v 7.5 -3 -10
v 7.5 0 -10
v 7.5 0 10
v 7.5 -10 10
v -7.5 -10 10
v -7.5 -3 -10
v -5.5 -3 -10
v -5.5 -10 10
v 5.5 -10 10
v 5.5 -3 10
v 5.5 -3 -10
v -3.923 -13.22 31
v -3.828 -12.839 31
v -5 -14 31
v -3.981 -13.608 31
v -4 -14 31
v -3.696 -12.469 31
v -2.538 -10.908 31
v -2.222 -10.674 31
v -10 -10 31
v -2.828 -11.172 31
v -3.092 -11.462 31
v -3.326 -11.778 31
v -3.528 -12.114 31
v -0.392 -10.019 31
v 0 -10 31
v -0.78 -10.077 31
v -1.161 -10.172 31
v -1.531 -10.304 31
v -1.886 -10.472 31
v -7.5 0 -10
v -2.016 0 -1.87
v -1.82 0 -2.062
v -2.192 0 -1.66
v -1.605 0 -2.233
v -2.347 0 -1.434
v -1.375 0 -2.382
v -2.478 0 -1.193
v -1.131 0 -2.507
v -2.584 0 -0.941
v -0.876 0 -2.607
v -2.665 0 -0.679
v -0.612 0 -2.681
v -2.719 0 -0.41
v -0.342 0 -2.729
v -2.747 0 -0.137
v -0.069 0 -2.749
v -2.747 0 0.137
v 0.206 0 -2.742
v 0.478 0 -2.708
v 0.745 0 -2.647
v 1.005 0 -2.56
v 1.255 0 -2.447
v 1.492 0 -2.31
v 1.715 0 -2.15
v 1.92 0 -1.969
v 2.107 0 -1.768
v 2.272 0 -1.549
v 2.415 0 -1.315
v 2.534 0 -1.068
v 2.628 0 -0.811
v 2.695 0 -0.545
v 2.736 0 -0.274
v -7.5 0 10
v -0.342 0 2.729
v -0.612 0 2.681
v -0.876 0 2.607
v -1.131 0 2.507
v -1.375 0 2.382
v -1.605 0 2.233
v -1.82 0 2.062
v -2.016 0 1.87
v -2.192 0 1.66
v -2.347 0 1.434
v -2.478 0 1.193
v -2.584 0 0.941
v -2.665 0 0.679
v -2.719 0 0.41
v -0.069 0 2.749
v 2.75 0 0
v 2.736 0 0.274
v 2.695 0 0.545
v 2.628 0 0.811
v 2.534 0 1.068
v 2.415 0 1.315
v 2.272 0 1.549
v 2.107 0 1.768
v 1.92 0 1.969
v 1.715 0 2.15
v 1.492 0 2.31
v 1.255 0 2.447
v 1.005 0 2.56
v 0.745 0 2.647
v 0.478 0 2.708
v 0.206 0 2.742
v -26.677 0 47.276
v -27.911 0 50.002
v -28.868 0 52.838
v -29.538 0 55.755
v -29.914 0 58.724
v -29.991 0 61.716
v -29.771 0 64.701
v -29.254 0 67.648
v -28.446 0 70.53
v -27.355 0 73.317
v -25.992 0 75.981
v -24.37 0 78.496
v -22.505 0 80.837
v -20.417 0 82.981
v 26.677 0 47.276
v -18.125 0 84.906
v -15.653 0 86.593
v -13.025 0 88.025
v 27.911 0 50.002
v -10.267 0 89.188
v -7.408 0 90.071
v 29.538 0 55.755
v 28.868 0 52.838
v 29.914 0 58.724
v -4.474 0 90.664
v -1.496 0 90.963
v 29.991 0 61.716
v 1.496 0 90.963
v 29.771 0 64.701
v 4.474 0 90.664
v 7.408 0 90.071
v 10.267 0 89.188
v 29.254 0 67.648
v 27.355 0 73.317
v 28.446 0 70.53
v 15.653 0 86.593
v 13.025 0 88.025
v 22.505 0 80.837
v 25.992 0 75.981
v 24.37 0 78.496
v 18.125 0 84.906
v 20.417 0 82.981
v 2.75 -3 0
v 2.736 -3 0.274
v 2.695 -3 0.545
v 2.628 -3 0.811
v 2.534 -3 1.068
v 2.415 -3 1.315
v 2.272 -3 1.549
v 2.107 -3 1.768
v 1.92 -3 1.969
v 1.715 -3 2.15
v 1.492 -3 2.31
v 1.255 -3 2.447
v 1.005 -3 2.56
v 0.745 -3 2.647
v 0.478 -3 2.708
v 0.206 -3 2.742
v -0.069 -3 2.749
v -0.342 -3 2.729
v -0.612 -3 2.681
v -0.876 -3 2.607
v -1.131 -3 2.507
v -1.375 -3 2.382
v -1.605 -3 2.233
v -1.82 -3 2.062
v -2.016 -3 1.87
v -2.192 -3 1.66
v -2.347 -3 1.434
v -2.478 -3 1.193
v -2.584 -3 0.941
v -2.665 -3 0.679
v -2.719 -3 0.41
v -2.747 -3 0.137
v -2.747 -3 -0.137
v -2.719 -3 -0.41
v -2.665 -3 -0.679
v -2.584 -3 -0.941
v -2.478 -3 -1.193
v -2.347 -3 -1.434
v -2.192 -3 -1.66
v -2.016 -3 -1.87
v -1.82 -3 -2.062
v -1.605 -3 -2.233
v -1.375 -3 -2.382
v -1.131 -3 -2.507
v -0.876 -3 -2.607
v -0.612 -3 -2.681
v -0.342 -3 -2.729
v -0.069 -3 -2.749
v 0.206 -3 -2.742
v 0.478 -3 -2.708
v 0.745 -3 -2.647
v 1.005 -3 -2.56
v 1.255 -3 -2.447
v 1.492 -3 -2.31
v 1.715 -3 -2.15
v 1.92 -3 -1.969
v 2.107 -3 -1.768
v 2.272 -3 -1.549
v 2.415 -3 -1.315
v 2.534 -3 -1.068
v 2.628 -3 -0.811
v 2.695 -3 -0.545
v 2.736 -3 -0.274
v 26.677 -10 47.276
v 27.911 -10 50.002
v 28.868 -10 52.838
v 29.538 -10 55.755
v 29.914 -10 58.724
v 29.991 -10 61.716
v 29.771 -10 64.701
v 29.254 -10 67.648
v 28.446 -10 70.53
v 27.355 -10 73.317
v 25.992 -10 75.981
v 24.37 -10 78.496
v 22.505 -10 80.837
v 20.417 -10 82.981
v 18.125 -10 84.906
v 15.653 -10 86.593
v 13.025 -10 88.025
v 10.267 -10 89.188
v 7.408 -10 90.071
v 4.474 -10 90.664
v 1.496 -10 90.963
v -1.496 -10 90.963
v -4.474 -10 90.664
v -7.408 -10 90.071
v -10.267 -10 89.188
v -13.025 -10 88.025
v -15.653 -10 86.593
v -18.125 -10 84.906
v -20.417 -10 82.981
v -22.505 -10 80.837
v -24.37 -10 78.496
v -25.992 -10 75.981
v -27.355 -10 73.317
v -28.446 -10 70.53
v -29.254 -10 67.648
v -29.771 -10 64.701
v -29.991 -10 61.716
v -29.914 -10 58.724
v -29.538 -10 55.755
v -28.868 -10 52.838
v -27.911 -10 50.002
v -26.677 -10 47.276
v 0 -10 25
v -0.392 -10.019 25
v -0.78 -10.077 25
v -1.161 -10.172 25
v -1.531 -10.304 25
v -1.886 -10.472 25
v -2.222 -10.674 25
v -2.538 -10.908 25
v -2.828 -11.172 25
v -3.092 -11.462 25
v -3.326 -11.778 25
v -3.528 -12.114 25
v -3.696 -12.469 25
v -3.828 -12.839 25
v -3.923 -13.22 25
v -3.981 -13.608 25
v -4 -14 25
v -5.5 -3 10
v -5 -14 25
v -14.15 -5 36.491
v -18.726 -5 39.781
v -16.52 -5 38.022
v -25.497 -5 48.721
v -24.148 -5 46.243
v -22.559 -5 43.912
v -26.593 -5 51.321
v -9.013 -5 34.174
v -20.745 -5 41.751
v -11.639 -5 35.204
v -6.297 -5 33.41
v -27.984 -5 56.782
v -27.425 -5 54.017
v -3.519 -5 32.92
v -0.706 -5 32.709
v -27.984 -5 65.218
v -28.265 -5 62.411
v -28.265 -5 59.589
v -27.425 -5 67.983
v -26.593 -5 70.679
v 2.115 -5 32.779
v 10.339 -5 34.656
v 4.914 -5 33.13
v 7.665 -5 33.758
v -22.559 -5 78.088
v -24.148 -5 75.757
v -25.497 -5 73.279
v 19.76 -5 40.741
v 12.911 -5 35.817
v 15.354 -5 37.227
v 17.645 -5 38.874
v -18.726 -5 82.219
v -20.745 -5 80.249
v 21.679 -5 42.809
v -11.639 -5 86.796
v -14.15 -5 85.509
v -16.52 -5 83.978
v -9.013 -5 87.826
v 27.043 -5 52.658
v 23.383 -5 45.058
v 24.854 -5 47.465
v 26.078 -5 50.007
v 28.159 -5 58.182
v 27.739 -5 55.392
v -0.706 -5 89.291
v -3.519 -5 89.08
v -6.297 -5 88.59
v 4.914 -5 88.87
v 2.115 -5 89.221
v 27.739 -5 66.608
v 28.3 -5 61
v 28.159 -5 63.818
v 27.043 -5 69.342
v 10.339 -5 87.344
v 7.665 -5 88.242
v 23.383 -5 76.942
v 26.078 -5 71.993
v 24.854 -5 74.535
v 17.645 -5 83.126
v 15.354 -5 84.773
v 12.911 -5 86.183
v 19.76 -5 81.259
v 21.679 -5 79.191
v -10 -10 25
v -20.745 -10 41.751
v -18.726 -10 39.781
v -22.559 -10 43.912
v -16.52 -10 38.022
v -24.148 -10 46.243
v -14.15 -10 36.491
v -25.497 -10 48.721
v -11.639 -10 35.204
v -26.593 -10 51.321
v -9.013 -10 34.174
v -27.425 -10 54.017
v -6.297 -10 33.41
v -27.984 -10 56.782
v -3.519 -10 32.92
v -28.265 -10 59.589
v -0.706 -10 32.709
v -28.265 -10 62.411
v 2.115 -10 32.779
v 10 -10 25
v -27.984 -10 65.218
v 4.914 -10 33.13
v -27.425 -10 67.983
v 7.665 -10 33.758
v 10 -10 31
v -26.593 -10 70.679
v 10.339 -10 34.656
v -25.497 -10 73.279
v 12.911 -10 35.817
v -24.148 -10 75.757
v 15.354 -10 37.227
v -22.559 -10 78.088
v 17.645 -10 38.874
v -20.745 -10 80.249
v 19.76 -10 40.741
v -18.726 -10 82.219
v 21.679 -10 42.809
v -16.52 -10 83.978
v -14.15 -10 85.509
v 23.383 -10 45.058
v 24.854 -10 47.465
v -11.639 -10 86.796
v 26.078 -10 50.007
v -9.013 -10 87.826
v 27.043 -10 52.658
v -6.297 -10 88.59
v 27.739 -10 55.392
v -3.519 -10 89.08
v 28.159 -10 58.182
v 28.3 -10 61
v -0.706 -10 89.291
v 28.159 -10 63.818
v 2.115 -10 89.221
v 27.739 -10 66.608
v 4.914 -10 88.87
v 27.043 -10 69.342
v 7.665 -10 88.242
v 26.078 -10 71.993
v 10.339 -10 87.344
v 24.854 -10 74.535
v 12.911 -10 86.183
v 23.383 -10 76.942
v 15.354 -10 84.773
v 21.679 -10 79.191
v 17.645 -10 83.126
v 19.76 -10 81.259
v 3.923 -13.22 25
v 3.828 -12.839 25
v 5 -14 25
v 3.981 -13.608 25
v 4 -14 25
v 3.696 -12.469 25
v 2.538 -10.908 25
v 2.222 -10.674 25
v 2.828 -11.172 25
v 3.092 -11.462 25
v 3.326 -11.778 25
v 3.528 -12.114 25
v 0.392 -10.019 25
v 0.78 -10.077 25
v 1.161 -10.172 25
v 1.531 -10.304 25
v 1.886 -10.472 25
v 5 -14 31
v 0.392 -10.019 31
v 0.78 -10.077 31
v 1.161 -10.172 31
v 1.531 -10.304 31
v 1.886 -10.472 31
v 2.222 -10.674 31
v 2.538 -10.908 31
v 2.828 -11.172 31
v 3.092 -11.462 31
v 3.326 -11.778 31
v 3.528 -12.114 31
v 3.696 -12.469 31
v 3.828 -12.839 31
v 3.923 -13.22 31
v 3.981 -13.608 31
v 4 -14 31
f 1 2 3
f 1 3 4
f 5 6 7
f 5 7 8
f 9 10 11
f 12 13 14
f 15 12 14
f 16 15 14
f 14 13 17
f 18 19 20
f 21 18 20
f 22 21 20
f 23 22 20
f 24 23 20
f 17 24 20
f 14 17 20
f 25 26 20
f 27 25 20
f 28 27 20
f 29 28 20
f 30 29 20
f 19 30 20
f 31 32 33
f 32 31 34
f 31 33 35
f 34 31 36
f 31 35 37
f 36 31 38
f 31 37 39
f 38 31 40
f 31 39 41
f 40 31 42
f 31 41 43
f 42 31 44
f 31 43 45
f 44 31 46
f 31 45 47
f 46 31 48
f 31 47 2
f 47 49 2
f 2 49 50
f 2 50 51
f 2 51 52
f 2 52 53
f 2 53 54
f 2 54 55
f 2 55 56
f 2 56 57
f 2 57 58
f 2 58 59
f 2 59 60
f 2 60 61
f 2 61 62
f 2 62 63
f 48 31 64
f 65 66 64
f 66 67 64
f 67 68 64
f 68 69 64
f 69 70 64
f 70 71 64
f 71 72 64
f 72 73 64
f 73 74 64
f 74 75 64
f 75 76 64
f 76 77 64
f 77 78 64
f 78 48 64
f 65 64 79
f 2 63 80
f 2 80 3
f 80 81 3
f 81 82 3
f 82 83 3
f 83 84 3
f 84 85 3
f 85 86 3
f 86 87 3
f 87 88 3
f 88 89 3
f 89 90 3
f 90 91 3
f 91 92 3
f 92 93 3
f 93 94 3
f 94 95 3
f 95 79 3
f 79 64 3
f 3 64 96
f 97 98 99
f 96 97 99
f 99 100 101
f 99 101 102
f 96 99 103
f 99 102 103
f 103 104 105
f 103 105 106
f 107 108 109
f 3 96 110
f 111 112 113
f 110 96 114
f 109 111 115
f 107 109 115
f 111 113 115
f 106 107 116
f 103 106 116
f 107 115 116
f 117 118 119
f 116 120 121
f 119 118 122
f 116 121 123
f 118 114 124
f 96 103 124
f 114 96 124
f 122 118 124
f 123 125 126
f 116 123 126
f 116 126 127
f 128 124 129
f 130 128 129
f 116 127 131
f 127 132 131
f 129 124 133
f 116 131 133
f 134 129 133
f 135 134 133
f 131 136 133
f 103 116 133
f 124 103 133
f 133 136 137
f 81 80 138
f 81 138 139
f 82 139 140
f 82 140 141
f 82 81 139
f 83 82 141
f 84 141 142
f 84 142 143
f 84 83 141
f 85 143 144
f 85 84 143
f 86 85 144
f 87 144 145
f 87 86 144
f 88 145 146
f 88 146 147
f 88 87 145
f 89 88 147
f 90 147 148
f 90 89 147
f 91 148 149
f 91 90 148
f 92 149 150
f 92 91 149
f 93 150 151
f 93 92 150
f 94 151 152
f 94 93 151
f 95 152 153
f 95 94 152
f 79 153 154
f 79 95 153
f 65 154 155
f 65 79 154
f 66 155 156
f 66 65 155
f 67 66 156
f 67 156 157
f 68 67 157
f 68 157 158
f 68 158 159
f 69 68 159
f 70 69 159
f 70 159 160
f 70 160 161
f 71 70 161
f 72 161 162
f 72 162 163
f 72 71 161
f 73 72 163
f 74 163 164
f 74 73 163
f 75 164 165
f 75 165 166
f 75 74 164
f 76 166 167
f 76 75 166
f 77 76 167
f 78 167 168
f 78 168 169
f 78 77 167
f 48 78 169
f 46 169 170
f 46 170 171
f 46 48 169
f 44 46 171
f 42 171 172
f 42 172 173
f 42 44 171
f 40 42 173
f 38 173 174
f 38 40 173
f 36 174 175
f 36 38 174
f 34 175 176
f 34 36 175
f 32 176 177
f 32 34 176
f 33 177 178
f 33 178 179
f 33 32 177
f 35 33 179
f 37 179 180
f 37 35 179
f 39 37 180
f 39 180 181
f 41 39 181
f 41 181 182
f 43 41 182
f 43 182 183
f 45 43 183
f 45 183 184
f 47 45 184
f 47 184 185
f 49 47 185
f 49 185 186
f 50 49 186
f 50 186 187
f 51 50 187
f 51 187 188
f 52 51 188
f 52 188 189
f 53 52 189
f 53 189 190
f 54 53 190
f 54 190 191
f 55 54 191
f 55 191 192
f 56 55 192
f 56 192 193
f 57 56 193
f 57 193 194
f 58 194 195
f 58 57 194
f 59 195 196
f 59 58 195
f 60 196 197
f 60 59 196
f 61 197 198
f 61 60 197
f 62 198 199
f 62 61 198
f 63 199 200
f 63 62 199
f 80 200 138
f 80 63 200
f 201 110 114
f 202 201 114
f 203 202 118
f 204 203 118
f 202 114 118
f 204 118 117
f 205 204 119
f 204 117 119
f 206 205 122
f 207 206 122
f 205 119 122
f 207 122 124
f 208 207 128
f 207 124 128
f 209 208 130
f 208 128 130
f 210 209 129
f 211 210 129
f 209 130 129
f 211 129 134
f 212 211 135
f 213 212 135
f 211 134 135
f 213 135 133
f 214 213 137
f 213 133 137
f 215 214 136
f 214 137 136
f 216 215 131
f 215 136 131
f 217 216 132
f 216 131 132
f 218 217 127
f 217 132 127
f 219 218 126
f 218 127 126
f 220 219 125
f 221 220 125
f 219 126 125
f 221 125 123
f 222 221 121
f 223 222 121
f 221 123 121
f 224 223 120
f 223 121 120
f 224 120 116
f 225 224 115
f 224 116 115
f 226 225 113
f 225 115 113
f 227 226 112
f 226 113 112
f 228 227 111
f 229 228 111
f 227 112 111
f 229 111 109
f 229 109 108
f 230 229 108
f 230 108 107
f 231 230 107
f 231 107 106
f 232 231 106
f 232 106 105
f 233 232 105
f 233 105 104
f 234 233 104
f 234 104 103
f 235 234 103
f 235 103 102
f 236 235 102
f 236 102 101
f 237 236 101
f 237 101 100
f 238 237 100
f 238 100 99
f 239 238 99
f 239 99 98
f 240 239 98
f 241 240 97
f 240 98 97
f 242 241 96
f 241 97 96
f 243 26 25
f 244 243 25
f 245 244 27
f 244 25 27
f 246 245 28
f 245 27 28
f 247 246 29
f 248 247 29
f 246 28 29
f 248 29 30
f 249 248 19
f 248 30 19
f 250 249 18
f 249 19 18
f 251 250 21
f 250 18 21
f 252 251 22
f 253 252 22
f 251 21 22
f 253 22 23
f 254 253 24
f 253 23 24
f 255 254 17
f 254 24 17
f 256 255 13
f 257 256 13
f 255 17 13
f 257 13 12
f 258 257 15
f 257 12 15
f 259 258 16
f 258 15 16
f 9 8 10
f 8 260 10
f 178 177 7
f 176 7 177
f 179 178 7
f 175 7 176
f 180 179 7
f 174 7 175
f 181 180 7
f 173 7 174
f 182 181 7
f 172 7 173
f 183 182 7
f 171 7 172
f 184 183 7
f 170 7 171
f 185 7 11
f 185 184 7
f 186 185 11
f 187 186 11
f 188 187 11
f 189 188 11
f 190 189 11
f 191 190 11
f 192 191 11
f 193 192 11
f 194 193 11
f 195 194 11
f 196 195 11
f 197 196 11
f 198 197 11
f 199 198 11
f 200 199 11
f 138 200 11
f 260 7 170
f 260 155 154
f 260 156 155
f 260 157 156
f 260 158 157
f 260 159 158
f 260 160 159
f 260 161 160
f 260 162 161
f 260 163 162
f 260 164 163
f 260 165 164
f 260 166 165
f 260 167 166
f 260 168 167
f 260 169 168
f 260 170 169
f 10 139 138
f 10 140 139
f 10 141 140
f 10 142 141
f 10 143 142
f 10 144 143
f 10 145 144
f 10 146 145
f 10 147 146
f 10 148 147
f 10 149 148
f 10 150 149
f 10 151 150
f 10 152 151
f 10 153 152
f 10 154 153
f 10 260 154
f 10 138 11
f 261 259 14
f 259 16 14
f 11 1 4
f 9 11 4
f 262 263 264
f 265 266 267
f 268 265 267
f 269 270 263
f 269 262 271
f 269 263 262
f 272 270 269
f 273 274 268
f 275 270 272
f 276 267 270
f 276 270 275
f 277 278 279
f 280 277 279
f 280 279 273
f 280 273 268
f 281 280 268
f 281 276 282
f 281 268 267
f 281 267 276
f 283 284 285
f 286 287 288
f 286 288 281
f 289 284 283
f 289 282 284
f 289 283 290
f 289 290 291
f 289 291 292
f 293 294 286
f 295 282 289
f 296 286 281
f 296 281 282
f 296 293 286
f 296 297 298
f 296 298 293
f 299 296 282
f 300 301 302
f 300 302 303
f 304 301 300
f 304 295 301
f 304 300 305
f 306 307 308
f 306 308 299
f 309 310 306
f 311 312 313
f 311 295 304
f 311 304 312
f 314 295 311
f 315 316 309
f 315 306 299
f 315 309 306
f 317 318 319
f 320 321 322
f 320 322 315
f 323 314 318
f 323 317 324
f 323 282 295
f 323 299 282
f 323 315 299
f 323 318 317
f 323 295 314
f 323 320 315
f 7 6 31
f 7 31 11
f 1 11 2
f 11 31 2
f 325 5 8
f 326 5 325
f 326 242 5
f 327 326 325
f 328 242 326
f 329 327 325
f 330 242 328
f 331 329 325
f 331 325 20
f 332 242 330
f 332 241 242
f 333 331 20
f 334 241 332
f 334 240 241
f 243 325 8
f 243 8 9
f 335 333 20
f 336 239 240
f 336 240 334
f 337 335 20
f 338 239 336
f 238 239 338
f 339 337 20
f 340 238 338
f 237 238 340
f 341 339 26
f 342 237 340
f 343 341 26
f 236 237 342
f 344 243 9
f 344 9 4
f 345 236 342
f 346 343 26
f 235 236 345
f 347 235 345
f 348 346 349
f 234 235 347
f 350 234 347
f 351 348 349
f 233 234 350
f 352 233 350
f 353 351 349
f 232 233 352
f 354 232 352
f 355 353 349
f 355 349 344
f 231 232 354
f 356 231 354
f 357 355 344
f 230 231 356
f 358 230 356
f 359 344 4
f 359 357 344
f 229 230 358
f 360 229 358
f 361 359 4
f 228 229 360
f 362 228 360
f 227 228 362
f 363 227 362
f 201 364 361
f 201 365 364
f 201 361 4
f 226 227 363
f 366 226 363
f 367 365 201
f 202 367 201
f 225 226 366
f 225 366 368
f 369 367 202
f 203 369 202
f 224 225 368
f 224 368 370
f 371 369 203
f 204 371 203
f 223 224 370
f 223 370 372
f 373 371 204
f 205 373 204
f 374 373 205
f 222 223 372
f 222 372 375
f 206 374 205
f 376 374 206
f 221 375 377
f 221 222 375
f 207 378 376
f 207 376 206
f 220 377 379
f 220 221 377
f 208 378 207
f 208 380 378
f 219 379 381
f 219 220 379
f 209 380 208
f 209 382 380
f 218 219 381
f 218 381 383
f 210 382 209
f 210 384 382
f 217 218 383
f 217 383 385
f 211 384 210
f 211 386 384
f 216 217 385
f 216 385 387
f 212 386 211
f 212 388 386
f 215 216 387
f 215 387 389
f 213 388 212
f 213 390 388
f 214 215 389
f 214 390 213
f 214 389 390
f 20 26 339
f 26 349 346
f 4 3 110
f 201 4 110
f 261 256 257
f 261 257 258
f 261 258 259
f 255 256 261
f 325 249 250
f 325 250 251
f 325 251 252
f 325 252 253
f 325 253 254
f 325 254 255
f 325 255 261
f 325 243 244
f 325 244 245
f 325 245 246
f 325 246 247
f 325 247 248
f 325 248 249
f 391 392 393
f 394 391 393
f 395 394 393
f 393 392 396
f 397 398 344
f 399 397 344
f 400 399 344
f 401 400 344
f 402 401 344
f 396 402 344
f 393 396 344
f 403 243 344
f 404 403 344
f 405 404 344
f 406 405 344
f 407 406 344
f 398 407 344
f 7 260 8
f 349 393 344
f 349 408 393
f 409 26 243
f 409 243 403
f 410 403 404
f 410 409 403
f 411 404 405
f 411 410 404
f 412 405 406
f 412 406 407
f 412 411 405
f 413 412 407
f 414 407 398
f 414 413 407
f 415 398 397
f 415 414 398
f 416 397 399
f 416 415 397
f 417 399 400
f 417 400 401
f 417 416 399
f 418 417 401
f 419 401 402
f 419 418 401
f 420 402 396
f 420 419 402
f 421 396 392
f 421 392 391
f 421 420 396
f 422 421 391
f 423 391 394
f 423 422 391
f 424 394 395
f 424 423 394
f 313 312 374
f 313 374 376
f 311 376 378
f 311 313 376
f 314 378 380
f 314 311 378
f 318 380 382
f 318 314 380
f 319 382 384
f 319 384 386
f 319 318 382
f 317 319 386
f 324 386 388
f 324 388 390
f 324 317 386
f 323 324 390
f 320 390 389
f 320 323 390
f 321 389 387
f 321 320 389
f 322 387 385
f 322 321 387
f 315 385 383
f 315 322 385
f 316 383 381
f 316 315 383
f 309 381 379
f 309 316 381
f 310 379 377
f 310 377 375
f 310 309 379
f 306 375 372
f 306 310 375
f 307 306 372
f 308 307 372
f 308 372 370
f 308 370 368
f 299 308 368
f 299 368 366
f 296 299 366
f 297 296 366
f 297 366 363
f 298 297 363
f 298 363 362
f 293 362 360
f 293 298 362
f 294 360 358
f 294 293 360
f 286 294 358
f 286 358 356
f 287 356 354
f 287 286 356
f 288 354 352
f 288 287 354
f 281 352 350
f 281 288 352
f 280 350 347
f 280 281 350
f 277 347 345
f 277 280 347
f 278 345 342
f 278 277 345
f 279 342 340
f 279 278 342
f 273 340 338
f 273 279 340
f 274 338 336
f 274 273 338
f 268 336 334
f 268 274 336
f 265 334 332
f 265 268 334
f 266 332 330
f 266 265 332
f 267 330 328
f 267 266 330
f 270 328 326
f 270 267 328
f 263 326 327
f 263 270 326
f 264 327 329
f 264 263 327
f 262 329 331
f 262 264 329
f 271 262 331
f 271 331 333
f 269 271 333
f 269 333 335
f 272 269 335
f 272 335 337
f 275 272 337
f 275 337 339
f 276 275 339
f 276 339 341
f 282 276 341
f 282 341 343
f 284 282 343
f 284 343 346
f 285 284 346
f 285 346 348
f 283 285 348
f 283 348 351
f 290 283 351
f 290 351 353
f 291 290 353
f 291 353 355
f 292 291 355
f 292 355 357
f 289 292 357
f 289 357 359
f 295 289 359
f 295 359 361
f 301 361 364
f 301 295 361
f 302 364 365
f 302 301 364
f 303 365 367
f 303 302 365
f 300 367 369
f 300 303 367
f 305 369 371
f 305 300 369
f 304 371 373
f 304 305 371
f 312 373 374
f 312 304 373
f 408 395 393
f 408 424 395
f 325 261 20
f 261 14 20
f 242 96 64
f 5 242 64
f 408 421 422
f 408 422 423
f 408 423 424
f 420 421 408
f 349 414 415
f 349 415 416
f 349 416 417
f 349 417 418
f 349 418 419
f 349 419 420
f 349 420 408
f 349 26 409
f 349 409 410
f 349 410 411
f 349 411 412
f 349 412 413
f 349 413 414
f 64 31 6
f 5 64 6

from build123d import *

# Parameters (mm, degrees)
SKETCH_W     = 15
SKETCH_H     = 50
SKETCH_R     = 2.75
PAD_DEPTH    = 3
PAD002_DEPTH = 10
SKETCH004_R  = 28.3
POCKET_DEPTH = 5
PAD003_DEPTH = 3
PAD004_DEPTH = 2


with BuildPart() as part:
    # Sketch → Pad (new body)
    with BuildSketch(Plane.XZ):
        with Locations((0, 15)):
            Rectangle(SKETCH_W, SKETCH_H)
        Circle(SKETCH_R, mode=Mode.SUBTRACT)
    extrude(amount=PAD_DEPTH)

    # Sketch003 → Pad002 (join)
    with BuildSketch(Plane.XZ):
        with BuildLine():
            ThreePointArc((26.676803, 47.276), (0, 91), (-26.676803, 47.276))
            Line((-26.676803, 47.276), (-7.5, 10))
            Line((-7.5, 10), (7.5, 10))
            Line((7.5, 10), (26.676803, 47.276))
        make_face()
    extrude(amount=PAD002_DEPTH)

    # Sketch004 (on DatumPlane) → Pocket (cut)
    with BuildSketch(Plane.XZ.offset(5)):
        with Locations((0, 61)):
            Circle(SKETCH004_R)
    extrude(amount=POCKET_DEPTH, mode=Mode.SUBTRACT)

    # Sketch006 (on DatumPlane) → Pad003 (join, symmetric)
    with BuildSketch(Plane.XY.offset(28)):
        with BuildLine():
            ThreePointArc((0, -10), (-2.828427, -11.171573), (-4, -14))
            Line((-4, -14), (-5, -14))
            Line((-5, -14), (-10, -10))
            Line((-10, -10), (0, -10))
        make_face()
    pad003 = extrude(amount=PAD003_DEPTH, both=True)

    # Mirrored: Pad003 across Sketch006 V_Axis
    add(pad003.mirror(Plane(origin=(0, 0, 28), x_dir=(0, 0, 1), z_dir=(1, 0, 0))))

    # Sketch007 (on DatumPlane) → Pad004 (join)
    with BuildSketch(Plane.YZ.offset(7.5)):
        Polygon((-3, -10), (-10, 10), (0, 10), (0, -10), align=None)
    pad004 = extrude(amount=-PAD004_DEPTH)

    # Mirrored001: Pad004 across YZ
    add(pad004.mirror(Plane.YZ))


solid = part.part
